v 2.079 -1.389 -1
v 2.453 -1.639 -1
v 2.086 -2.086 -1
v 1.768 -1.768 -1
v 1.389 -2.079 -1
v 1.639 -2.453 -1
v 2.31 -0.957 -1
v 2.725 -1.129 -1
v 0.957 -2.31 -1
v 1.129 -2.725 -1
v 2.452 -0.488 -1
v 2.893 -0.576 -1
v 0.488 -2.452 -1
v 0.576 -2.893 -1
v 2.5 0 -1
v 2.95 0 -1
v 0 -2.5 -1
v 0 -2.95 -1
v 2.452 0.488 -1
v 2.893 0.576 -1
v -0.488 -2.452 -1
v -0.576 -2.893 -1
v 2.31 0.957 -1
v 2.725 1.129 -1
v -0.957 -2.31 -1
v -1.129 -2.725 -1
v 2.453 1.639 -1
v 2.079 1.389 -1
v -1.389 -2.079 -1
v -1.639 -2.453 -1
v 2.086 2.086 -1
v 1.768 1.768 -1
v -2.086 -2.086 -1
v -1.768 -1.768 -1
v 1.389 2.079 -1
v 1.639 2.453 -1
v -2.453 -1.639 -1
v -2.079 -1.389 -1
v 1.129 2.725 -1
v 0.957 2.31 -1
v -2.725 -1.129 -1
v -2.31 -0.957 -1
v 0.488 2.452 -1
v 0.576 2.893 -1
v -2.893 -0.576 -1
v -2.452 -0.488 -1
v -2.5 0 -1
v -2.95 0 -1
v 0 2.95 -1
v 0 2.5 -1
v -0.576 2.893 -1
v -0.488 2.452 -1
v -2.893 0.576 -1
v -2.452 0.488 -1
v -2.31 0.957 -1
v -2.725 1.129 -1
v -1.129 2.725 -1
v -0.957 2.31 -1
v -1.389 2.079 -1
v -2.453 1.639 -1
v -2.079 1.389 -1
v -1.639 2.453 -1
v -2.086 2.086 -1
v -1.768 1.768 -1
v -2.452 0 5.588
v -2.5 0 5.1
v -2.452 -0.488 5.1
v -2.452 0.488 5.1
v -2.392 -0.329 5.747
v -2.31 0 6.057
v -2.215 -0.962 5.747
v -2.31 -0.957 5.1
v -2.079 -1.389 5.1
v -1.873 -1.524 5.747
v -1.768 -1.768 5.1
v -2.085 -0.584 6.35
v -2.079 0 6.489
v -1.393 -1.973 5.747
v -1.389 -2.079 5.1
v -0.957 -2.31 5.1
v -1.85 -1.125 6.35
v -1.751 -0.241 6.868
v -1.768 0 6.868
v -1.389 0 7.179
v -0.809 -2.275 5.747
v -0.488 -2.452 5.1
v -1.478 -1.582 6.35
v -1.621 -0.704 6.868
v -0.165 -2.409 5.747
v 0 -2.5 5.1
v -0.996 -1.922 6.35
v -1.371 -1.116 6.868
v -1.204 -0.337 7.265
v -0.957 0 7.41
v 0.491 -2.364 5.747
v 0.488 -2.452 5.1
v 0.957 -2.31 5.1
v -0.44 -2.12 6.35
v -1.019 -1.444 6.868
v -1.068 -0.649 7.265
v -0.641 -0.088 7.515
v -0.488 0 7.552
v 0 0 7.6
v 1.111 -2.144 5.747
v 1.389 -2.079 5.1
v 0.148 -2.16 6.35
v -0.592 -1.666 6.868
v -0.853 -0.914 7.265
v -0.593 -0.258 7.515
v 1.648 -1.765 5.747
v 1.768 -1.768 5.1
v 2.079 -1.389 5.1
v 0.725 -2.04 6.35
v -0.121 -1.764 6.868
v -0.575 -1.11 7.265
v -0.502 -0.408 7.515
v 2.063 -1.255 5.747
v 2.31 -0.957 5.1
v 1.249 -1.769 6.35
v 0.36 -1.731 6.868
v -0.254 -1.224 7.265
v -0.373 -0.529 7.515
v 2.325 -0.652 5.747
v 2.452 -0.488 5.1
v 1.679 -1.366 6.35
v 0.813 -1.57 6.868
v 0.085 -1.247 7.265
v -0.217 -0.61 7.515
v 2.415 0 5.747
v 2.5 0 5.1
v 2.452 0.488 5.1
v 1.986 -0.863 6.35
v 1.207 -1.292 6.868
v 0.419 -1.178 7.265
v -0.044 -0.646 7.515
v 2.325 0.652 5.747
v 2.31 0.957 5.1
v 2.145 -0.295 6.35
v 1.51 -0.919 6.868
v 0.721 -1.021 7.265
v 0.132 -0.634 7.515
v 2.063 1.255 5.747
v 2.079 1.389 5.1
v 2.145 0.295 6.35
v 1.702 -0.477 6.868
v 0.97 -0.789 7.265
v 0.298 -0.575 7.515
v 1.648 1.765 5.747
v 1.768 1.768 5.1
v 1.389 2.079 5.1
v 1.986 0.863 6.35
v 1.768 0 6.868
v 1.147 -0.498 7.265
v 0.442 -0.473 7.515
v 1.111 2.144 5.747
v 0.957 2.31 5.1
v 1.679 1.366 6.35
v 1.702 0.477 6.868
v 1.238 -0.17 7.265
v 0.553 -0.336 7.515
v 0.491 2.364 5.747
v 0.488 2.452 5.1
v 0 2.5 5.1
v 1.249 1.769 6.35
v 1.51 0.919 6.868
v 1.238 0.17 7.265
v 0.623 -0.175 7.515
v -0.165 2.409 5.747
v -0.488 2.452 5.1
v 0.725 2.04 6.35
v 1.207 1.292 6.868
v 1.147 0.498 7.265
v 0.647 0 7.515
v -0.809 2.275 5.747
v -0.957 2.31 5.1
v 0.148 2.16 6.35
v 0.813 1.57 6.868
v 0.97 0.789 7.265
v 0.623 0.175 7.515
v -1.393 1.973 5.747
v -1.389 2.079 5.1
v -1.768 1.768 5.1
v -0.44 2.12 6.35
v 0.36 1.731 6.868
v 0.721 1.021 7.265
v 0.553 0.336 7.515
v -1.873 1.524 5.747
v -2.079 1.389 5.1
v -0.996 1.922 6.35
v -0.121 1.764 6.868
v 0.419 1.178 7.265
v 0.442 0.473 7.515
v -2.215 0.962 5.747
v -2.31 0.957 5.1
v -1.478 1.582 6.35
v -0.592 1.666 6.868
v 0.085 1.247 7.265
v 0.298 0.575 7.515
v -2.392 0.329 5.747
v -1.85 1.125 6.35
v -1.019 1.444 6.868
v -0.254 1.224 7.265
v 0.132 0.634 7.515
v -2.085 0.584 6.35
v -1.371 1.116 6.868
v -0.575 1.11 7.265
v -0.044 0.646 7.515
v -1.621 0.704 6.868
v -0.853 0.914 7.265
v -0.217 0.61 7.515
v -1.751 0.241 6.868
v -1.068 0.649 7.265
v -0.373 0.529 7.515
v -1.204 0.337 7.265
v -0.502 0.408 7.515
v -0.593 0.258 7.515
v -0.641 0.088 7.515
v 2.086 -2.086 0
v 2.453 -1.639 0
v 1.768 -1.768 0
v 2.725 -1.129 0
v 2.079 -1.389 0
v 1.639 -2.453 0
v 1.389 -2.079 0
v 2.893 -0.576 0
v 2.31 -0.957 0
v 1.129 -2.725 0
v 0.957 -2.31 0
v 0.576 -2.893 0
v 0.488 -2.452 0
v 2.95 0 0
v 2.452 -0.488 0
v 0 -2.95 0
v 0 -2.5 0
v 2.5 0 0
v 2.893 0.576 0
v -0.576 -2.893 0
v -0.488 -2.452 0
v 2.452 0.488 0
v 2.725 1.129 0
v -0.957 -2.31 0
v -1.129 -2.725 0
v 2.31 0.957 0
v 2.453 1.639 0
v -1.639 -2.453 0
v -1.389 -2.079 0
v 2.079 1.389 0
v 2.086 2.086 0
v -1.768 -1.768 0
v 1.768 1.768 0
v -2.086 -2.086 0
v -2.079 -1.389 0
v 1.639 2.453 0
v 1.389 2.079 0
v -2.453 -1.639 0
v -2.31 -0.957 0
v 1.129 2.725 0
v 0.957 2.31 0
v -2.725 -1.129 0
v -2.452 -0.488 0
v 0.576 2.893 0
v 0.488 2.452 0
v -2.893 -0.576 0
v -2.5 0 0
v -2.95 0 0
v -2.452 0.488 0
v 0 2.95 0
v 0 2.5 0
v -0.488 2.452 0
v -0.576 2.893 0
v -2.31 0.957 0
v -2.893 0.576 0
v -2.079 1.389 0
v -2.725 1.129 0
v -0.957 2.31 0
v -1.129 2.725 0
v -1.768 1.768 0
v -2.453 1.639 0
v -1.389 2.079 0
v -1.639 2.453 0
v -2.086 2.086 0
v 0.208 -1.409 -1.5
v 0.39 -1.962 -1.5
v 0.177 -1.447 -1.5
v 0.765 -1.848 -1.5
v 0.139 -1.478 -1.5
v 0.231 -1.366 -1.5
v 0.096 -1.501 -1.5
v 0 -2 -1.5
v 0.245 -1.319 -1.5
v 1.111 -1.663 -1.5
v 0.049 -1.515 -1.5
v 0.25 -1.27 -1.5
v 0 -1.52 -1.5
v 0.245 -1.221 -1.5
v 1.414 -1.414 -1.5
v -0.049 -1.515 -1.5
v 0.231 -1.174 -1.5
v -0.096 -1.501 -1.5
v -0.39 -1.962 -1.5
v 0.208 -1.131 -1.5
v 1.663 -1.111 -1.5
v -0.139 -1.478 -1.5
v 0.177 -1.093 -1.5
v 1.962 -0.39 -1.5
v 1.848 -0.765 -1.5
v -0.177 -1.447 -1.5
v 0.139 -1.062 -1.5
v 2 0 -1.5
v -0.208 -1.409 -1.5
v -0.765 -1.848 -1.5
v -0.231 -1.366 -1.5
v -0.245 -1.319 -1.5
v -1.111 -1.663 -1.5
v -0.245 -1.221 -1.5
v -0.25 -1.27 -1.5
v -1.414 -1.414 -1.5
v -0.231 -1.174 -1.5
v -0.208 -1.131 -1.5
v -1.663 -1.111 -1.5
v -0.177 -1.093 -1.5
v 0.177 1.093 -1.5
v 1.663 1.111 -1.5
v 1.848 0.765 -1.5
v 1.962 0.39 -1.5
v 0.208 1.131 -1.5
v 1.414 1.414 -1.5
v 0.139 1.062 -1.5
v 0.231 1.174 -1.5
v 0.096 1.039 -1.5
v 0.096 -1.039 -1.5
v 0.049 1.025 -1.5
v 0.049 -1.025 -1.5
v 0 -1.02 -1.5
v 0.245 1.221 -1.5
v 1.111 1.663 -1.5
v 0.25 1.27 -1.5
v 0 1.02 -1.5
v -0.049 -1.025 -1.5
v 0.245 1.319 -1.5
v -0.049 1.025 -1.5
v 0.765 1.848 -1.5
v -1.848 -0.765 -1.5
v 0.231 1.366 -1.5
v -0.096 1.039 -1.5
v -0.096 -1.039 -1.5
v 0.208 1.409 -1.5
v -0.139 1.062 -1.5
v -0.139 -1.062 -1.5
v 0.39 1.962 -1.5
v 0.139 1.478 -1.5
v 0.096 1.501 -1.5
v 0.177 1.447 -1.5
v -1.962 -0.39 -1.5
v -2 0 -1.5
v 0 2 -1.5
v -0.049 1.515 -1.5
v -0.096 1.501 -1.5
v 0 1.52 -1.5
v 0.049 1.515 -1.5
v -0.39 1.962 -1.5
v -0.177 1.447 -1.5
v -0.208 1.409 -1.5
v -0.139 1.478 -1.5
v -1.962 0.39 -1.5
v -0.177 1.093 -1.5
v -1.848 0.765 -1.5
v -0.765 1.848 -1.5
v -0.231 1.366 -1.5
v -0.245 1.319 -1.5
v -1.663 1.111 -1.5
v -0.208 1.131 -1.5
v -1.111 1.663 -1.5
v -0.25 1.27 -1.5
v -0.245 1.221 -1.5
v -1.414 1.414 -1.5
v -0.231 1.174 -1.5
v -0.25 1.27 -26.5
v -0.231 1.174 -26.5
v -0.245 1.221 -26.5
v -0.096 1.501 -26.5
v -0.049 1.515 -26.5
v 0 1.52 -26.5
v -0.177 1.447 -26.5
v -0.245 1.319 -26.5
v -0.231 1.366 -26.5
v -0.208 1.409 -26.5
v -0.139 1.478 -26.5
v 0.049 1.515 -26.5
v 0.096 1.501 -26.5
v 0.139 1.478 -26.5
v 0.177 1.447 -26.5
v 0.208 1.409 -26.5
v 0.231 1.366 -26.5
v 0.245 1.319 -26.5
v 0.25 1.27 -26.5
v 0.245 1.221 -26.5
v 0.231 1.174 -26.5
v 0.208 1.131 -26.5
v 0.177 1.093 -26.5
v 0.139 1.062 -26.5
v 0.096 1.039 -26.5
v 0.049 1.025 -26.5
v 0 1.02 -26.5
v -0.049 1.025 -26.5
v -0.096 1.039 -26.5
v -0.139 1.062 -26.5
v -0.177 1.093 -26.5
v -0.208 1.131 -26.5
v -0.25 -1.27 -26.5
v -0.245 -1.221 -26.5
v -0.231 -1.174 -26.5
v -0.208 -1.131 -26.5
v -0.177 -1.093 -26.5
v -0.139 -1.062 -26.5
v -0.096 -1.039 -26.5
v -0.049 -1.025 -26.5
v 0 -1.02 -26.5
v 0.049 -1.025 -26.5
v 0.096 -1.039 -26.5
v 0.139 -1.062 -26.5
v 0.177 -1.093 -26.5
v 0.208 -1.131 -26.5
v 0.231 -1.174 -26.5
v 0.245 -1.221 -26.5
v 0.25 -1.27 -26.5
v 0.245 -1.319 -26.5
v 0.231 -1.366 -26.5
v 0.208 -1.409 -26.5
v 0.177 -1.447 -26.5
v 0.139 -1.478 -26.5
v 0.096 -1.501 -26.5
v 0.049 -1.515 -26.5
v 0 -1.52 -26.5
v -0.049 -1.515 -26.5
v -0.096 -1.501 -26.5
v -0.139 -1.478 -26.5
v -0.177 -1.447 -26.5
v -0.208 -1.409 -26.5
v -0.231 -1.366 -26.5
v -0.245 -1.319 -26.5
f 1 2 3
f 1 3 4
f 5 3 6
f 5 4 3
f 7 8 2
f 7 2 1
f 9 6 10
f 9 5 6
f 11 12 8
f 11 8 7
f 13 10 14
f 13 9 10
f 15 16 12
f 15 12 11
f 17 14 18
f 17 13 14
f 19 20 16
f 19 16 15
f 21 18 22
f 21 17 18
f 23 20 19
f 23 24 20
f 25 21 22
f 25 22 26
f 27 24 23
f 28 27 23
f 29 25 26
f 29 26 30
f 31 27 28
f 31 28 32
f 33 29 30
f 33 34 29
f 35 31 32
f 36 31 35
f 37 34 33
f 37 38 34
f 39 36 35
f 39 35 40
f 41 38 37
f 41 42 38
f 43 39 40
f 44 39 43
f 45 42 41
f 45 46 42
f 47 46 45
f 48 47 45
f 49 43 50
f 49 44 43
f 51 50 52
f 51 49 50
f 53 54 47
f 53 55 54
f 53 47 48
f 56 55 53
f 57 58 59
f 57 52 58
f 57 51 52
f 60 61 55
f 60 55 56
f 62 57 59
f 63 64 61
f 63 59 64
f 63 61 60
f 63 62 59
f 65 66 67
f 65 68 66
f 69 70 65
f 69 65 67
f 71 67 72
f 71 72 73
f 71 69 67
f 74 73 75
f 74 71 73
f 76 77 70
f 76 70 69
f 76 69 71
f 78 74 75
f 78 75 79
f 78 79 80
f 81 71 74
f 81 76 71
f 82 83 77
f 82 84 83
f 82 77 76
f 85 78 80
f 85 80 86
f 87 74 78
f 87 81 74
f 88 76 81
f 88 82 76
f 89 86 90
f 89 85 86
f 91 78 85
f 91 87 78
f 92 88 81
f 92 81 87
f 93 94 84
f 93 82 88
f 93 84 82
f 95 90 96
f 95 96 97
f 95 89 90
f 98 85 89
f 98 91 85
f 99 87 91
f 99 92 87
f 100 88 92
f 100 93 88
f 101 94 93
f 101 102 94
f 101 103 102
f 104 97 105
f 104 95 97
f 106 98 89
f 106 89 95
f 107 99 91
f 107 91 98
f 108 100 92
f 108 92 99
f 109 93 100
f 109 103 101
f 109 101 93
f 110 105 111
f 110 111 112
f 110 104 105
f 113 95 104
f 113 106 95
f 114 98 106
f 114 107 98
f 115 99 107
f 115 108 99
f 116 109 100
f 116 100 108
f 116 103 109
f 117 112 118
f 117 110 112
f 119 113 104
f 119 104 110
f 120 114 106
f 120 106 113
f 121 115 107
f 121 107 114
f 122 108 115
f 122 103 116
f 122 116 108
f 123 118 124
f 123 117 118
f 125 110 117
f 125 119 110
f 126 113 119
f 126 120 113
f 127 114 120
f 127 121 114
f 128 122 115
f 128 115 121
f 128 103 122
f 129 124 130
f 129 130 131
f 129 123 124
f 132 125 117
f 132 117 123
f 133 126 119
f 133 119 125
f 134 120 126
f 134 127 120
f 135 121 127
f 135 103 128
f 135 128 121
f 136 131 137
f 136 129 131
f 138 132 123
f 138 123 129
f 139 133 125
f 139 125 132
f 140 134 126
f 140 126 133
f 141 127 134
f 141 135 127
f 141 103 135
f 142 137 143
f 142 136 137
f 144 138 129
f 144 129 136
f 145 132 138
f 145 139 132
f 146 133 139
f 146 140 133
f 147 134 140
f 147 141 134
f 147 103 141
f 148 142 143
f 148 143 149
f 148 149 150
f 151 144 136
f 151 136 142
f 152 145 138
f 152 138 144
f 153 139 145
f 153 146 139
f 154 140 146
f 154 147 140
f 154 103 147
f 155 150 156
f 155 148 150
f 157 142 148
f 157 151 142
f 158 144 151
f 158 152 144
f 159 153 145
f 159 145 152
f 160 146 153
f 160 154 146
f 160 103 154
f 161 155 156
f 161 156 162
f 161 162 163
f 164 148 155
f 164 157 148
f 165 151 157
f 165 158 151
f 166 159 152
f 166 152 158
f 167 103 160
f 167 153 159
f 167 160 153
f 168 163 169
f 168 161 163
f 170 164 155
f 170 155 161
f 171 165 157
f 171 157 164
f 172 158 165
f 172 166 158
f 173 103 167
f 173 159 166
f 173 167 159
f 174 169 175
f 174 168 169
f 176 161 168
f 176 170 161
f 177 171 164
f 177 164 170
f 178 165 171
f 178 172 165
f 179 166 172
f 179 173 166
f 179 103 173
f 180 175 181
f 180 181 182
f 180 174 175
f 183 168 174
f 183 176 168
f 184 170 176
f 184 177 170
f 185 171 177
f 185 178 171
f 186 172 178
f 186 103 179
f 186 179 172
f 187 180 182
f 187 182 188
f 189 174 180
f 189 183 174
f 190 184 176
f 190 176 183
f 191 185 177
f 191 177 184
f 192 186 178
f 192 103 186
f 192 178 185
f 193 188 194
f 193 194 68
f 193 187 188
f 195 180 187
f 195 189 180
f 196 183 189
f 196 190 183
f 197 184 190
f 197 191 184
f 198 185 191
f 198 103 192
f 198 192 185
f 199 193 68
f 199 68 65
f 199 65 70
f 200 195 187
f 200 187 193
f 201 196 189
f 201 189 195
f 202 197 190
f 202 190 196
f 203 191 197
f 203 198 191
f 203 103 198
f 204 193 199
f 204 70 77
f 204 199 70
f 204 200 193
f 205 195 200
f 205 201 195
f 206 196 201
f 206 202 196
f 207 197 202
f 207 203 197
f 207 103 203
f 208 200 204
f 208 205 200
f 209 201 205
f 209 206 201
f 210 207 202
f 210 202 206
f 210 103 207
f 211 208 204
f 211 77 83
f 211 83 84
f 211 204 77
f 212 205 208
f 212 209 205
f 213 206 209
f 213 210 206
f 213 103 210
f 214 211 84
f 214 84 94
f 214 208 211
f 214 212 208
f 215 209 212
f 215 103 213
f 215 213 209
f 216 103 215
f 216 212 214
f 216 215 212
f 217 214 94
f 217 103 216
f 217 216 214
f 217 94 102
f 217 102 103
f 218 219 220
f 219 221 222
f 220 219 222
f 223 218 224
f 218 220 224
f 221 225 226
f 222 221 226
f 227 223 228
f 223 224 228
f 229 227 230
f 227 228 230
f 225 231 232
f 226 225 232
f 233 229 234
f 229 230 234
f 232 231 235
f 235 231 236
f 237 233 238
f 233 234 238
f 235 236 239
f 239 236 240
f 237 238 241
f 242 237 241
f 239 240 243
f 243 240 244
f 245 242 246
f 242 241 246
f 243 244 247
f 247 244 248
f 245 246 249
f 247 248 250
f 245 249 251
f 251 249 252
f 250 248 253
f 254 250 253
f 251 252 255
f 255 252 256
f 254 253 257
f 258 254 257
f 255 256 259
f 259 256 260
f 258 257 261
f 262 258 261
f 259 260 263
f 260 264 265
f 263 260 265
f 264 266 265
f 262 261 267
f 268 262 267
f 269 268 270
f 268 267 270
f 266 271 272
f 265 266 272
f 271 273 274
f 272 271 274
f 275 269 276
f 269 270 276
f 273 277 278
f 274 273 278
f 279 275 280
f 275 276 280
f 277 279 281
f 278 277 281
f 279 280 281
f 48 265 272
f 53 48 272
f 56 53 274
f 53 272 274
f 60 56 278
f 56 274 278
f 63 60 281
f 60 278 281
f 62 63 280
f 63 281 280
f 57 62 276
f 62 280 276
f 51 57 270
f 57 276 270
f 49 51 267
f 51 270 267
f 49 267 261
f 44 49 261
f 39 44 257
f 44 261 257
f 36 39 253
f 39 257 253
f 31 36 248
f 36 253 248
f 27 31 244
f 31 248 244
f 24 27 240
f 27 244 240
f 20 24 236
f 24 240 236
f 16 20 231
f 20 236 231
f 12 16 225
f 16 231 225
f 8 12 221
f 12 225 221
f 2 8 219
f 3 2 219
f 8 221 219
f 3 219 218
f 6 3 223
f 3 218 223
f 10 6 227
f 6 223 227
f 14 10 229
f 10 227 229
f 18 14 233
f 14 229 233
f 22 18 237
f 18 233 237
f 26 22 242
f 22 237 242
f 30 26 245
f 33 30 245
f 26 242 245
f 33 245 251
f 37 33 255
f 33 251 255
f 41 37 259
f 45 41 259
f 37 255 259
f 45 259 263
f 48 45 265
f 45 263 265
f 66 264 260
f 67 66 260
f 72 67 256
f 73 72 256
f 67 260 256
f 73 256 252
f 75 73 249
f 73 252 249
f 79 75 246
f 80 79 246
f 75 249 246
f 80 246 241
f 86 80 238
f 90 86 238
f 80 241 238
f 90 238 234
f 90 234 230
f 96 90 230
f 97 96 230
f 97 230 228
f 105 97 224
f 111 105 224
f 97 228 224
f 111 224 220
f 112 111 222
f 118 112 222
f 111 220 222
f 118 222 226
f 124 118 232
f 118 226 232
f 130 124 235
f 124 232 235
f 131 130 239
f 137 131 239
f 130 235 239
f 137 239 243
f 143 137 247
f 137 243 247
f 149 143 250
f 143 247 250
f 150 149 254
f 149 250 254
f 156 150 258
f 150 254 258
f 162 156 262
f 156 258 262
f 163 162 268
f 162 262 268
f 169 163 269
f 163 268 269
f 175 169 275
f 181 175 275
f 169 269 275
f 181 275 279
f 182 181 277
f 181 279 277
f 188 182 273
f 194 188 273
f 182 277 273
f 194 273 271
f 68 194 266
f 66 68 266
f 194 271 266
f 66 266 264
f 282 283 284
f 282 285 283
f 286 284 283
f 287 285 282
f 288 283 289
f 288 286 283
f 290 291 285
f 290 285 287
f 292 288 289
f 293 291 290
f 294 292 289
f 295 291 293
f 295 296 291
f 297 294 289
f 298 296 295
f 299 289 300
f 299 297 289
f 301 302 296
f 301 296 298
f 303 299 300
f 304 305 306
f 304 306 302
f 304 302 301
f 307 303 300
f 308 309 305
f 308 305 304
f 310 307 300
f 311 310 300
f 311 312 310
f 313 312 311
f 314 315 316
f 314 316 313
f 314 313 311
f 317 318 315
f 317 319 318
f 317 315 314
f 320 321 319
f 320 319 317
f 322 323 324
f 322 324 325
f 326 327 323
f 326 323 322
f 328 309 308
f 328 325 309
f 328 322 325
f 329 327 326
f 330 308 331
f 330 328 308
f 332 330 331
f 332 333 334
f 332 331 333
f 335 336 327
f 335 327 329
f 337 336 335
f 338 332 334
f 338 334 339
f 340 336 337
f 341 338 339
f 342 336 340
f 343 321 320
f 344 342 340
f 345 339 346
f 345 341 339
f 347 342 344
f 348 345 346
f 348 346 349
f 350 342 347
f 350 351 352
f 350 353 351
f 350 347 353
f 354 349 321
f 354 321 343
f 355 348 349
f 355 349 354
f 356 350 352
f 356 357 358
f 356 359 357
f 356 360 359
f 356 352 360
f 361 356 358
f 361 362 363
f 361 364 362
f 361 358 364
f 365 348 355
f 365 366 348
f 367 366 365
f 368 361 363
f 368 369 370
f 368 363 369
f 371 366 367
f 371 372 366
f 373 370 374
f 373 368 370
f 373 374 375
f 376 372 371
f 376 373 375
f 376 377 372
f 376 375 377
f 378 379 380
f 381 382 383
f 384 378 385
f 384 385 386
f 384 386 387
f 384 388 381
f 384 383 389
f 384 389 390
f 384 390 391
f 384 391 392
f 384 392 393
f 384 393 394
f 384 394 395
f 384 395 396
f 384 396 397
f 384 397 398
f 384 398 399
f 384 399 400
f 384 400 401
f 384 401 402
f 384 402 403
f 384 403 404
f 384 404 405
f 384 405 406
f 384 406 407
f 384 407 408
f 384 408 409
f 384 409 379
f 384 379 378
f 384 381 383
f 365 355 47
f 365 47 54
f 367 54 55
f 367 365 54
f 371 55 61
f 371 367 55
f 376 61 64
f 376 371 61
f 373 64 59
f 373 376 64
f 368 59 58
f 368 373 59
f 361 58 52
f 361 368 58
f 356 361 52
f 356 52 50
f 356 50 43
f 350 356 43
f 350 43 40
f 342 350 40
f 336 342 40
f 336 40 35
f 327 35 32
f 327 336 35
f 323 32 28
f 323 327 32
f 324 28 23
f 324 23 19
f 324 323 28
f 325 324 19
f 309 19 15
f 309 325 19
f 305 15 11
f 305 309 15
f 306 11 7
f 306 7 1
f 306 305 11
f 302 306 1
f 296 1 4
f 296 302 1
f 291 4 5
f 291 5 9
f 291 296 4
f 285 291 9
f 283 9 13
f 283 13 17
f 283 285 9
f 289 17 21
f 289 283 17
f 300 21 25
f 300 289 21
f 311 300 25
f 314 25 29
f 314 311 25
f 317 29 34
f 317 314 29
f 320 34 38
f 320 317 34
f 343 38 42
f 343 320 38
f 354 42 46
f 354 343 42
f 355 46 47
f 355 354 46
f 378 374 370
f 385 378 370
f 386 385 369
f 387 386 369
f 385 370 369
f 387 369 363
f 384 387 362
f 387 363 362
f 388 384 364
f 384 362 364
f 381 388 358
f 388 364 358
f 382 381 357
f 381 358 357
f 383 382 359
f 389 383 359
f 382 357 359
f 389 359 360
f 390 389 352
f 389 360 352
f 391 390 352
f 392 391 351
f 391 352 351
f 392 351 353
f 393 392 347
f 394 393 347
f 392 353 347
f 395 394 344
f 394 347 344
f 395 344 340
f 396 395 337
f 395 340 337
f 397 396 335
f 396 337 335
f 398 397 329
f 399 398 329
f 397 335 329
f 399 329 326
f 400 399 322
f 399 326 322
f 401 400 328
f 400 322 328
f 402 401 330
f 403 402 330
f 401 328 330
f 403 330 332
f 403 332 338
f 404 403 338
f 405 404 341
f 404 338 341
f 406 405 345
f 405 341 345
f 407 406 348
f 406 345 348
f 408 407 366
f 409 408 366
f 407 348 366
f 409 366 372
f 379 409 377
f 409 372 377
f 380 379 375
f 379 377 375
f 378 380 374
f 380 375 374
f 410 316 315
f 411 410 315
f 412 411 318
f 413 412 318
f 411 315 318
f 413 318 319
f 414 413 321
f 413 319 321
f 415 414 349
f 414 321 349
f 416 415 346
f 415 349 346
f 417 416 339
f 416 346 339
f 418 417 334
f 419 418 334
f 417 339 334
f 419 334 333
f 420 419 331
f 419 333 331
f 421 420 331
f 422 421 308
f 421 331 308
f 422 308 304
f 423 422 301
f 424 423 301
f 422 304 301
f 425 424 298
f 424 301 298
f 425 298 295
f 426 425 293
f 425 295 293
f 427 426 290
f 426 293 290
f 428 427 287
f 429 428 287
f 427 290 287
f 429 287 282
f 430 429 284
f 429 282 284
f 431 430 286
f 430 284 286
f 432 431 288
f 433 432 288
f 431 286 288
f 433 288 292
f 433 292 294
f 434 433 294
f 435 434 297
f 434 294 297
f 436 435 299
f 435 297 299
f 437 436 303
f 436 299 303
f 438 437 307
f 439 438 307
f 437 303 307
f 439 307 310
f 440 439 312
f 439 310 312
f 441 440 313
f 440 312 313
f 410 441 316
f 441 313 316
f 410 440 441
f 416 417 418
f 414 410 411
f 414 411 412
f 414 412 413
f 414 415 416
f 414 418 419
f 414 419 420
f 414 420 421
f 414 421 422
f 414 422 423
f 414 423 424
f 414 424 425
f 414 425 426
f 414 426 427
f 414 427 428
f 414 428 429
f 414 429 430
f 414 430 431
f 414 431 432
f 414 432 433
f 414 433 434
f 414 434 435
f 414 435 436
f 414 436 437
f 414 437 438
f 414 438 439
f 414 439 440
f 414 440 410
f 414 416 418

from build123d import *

# Parameters (mm, degrees)
SKETCH_1_R      = 2.5
EXTRUDE_1_DEPTH = 7.6
FILLET_1_R      = 2.5
SKETCH_2_R      = 2.95
EXTRUDE_2_DEPTH = 1
EXTRUDE_START   = 0.5
SKETCH_3_R      = 2.5
EXTRUDE_3_DEPTH = 0.5
CHAMFER_1_SIZE  = 0.5
SKETCH_4_R      = 0.25
EXTRUDE_4_DEPTH = 25


with BuildPart() as part:
    # Эскиз1 → Бобышка-Вытянуть1 (new body)
    with BuildSketch(Plane.XY):
        with Locations(Location((0, 0, 0), (0, 0, 180))):
            Circle(SKETCH_1_R)
    extrude(amount=EXTRUDE_1_DEPTH)

    # Скругление1
    fillet_1_edges = [part.edges().sort_by_distance(p)[0] for p in [
        (2.5, 0, 7.6),
    ]]
    fillet(fillet_1_edges, radius=FILLET_1_R)

    # Эскиз2 → Бобышка-Вытянуть2 (add)
    with BuildSketch(Plane(origin=(0, 0, 0), x_dir=(-1, 0, 0), z_dir=(0, 0, -1))):
        Circle(SKETCH_2_R)
    extrude(amount=EXTRUDE_2_DEPTH)

    # Эскиз3 → Бобышка-Вытянуть3 (add)
    with BuildSketch(Plane(origin=(0, 0, -1), x_dir=(-1, 0, 0), z_dir=(0, 0, -1)).offset(EXTRUDE_START)):
        Circle(SKETCH_3_R)
    extrude(amount=-EXTRUDE_3_DEPTH)

    # Фаска1
    chamfer_1_edges = [part.edges().sort_by_distance(p)[0] for p in [
        (2.5, 0, -1.5),
    ]]
    chamfer(chamfer_1_edges, length=CHAMFER_1_SIZE - 0.0001)  # a hair under: the kernel refuses the full size

    # Эскиз4 → Бобышка-Вытянуть4 (add)
    with BuildSketch(Plane(origin=(0, 0, -1.5), x_dir=(-1, 0, 0), z_dir=(0, 0, -1))):
        with Locations((0, 1.27)):
            Circle(SKETCH_4_R)
        with Locations((0, -1.27)):
            Circle(SKETCH_4_R)
    extrude(amount=EXTRUDE_4_DEPTH)


solid = part.part
